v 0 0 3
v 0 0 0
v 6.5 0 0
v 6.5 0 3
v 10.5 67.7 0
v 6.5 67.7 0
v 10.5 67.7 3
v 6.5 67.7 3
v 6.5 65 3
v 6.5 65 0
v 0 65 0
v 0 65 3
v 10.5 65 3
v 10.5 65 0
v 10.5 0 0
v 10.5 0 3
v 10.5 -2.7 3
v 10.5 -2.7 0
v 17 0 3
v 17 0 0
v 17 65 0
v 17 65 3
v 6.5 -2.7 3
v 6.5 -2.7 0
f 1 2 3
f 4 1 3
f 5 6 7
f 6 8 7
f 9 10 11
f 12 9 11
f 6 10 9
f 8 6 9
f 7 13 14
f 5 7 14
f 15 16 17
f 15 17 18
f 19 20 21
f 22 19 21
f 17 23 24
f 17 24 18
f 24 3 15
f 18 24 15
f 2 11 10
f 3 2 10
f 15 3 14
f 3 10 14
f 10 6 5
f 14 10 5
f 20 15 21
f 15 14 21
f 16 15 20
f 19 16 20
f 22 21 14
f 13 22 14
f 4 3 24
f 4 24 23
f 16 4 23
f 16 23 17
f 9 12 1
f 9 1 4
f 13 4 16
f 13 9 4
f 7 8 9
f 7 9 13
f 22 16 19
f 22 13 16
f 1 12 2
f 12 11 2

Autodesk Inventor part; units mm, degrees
ref_plane "YZ Plane" through (0, 0, 0) normal (1, 0, 0) x (0, 1, 0)
ref_plane "XZ Plane" through (0, 0, 0) normal (0, 1, 0) x (-1, 0, 0)
ref_plane "XY Plane" through (0, 0, 0) normal (0, 0, 1) x (1, 0, 0)
sketch "Sketch3" plane through (0, 0, 0) normal (0, 0, 1) x (1, 0, 0)
  line L0 (0, 0) -> (17, 0)
  line L1 (17, 0) -> (17, 65)
  line L2 (17, 65) -> (0, 65)
  line L3 (0, 65) -> (0, 0)
  dimension "d0" = 17
  dimension "d1" = 65
  dimension "d2" = 17
extrude "Extrusion1" add sketch "Sketch3" along normal blind 3
sketch "Sketch4" plane through (0, 0, 0) normal (0, -1, 0) x (1, 0, 0)
  line L0 (0, 0) -> (0, 3) projected
  line L1 (0, 1.5) -> (17, 1.5)
  line L2 (17, 0) -> (17, 3) projected
  line L3 (17, 3) -> (0, 3) projected
  line L4 (8.5, 3) -> (8.5, 0)
  line L5 (17, 0) -> (0, 0) projected
  line L6 (8.5, 1.5) -> (6.5, 1.5)
  line L7 (6.5, 1.5) -> (6.5, 3)
  line L8 (8.5, 1.5) -> (10.5, 1.5)
  line L9 (10.5, 1.5) -> (10.5, 0)
  line L10 (6.5, 3) -> (10.5, 3)
  line L11 (10.5, 3) -> (10.5, 0)
  line L12 (10.5, 0) -> (6.5, 0)
  line L13 (6.5, 0) -> (6.5, 3)
  dimension "d5" = 2
  dimension "d6" = 1.5
  dimension "d7" = 2
  dimension "d8" = 1.5
extrude "Extrusion2" add sketch "Sketch4" along normal blind 2.7 contours L13 L1 L4 L5 | L7 L3 L4 L1 | L4 L1 L9 L5 | L4 L3 L11 L1
extrude "Extrusion3" add sketch "Sketch4" against normal blind 2.7 from surface at -65 contours L13 L1 L4 L5 | L7 L3 L4 L1 | L4 L1 L9 L5 | L4 L3 L11 L1
properties part number "carcasa_piezasRadio_3.0"
